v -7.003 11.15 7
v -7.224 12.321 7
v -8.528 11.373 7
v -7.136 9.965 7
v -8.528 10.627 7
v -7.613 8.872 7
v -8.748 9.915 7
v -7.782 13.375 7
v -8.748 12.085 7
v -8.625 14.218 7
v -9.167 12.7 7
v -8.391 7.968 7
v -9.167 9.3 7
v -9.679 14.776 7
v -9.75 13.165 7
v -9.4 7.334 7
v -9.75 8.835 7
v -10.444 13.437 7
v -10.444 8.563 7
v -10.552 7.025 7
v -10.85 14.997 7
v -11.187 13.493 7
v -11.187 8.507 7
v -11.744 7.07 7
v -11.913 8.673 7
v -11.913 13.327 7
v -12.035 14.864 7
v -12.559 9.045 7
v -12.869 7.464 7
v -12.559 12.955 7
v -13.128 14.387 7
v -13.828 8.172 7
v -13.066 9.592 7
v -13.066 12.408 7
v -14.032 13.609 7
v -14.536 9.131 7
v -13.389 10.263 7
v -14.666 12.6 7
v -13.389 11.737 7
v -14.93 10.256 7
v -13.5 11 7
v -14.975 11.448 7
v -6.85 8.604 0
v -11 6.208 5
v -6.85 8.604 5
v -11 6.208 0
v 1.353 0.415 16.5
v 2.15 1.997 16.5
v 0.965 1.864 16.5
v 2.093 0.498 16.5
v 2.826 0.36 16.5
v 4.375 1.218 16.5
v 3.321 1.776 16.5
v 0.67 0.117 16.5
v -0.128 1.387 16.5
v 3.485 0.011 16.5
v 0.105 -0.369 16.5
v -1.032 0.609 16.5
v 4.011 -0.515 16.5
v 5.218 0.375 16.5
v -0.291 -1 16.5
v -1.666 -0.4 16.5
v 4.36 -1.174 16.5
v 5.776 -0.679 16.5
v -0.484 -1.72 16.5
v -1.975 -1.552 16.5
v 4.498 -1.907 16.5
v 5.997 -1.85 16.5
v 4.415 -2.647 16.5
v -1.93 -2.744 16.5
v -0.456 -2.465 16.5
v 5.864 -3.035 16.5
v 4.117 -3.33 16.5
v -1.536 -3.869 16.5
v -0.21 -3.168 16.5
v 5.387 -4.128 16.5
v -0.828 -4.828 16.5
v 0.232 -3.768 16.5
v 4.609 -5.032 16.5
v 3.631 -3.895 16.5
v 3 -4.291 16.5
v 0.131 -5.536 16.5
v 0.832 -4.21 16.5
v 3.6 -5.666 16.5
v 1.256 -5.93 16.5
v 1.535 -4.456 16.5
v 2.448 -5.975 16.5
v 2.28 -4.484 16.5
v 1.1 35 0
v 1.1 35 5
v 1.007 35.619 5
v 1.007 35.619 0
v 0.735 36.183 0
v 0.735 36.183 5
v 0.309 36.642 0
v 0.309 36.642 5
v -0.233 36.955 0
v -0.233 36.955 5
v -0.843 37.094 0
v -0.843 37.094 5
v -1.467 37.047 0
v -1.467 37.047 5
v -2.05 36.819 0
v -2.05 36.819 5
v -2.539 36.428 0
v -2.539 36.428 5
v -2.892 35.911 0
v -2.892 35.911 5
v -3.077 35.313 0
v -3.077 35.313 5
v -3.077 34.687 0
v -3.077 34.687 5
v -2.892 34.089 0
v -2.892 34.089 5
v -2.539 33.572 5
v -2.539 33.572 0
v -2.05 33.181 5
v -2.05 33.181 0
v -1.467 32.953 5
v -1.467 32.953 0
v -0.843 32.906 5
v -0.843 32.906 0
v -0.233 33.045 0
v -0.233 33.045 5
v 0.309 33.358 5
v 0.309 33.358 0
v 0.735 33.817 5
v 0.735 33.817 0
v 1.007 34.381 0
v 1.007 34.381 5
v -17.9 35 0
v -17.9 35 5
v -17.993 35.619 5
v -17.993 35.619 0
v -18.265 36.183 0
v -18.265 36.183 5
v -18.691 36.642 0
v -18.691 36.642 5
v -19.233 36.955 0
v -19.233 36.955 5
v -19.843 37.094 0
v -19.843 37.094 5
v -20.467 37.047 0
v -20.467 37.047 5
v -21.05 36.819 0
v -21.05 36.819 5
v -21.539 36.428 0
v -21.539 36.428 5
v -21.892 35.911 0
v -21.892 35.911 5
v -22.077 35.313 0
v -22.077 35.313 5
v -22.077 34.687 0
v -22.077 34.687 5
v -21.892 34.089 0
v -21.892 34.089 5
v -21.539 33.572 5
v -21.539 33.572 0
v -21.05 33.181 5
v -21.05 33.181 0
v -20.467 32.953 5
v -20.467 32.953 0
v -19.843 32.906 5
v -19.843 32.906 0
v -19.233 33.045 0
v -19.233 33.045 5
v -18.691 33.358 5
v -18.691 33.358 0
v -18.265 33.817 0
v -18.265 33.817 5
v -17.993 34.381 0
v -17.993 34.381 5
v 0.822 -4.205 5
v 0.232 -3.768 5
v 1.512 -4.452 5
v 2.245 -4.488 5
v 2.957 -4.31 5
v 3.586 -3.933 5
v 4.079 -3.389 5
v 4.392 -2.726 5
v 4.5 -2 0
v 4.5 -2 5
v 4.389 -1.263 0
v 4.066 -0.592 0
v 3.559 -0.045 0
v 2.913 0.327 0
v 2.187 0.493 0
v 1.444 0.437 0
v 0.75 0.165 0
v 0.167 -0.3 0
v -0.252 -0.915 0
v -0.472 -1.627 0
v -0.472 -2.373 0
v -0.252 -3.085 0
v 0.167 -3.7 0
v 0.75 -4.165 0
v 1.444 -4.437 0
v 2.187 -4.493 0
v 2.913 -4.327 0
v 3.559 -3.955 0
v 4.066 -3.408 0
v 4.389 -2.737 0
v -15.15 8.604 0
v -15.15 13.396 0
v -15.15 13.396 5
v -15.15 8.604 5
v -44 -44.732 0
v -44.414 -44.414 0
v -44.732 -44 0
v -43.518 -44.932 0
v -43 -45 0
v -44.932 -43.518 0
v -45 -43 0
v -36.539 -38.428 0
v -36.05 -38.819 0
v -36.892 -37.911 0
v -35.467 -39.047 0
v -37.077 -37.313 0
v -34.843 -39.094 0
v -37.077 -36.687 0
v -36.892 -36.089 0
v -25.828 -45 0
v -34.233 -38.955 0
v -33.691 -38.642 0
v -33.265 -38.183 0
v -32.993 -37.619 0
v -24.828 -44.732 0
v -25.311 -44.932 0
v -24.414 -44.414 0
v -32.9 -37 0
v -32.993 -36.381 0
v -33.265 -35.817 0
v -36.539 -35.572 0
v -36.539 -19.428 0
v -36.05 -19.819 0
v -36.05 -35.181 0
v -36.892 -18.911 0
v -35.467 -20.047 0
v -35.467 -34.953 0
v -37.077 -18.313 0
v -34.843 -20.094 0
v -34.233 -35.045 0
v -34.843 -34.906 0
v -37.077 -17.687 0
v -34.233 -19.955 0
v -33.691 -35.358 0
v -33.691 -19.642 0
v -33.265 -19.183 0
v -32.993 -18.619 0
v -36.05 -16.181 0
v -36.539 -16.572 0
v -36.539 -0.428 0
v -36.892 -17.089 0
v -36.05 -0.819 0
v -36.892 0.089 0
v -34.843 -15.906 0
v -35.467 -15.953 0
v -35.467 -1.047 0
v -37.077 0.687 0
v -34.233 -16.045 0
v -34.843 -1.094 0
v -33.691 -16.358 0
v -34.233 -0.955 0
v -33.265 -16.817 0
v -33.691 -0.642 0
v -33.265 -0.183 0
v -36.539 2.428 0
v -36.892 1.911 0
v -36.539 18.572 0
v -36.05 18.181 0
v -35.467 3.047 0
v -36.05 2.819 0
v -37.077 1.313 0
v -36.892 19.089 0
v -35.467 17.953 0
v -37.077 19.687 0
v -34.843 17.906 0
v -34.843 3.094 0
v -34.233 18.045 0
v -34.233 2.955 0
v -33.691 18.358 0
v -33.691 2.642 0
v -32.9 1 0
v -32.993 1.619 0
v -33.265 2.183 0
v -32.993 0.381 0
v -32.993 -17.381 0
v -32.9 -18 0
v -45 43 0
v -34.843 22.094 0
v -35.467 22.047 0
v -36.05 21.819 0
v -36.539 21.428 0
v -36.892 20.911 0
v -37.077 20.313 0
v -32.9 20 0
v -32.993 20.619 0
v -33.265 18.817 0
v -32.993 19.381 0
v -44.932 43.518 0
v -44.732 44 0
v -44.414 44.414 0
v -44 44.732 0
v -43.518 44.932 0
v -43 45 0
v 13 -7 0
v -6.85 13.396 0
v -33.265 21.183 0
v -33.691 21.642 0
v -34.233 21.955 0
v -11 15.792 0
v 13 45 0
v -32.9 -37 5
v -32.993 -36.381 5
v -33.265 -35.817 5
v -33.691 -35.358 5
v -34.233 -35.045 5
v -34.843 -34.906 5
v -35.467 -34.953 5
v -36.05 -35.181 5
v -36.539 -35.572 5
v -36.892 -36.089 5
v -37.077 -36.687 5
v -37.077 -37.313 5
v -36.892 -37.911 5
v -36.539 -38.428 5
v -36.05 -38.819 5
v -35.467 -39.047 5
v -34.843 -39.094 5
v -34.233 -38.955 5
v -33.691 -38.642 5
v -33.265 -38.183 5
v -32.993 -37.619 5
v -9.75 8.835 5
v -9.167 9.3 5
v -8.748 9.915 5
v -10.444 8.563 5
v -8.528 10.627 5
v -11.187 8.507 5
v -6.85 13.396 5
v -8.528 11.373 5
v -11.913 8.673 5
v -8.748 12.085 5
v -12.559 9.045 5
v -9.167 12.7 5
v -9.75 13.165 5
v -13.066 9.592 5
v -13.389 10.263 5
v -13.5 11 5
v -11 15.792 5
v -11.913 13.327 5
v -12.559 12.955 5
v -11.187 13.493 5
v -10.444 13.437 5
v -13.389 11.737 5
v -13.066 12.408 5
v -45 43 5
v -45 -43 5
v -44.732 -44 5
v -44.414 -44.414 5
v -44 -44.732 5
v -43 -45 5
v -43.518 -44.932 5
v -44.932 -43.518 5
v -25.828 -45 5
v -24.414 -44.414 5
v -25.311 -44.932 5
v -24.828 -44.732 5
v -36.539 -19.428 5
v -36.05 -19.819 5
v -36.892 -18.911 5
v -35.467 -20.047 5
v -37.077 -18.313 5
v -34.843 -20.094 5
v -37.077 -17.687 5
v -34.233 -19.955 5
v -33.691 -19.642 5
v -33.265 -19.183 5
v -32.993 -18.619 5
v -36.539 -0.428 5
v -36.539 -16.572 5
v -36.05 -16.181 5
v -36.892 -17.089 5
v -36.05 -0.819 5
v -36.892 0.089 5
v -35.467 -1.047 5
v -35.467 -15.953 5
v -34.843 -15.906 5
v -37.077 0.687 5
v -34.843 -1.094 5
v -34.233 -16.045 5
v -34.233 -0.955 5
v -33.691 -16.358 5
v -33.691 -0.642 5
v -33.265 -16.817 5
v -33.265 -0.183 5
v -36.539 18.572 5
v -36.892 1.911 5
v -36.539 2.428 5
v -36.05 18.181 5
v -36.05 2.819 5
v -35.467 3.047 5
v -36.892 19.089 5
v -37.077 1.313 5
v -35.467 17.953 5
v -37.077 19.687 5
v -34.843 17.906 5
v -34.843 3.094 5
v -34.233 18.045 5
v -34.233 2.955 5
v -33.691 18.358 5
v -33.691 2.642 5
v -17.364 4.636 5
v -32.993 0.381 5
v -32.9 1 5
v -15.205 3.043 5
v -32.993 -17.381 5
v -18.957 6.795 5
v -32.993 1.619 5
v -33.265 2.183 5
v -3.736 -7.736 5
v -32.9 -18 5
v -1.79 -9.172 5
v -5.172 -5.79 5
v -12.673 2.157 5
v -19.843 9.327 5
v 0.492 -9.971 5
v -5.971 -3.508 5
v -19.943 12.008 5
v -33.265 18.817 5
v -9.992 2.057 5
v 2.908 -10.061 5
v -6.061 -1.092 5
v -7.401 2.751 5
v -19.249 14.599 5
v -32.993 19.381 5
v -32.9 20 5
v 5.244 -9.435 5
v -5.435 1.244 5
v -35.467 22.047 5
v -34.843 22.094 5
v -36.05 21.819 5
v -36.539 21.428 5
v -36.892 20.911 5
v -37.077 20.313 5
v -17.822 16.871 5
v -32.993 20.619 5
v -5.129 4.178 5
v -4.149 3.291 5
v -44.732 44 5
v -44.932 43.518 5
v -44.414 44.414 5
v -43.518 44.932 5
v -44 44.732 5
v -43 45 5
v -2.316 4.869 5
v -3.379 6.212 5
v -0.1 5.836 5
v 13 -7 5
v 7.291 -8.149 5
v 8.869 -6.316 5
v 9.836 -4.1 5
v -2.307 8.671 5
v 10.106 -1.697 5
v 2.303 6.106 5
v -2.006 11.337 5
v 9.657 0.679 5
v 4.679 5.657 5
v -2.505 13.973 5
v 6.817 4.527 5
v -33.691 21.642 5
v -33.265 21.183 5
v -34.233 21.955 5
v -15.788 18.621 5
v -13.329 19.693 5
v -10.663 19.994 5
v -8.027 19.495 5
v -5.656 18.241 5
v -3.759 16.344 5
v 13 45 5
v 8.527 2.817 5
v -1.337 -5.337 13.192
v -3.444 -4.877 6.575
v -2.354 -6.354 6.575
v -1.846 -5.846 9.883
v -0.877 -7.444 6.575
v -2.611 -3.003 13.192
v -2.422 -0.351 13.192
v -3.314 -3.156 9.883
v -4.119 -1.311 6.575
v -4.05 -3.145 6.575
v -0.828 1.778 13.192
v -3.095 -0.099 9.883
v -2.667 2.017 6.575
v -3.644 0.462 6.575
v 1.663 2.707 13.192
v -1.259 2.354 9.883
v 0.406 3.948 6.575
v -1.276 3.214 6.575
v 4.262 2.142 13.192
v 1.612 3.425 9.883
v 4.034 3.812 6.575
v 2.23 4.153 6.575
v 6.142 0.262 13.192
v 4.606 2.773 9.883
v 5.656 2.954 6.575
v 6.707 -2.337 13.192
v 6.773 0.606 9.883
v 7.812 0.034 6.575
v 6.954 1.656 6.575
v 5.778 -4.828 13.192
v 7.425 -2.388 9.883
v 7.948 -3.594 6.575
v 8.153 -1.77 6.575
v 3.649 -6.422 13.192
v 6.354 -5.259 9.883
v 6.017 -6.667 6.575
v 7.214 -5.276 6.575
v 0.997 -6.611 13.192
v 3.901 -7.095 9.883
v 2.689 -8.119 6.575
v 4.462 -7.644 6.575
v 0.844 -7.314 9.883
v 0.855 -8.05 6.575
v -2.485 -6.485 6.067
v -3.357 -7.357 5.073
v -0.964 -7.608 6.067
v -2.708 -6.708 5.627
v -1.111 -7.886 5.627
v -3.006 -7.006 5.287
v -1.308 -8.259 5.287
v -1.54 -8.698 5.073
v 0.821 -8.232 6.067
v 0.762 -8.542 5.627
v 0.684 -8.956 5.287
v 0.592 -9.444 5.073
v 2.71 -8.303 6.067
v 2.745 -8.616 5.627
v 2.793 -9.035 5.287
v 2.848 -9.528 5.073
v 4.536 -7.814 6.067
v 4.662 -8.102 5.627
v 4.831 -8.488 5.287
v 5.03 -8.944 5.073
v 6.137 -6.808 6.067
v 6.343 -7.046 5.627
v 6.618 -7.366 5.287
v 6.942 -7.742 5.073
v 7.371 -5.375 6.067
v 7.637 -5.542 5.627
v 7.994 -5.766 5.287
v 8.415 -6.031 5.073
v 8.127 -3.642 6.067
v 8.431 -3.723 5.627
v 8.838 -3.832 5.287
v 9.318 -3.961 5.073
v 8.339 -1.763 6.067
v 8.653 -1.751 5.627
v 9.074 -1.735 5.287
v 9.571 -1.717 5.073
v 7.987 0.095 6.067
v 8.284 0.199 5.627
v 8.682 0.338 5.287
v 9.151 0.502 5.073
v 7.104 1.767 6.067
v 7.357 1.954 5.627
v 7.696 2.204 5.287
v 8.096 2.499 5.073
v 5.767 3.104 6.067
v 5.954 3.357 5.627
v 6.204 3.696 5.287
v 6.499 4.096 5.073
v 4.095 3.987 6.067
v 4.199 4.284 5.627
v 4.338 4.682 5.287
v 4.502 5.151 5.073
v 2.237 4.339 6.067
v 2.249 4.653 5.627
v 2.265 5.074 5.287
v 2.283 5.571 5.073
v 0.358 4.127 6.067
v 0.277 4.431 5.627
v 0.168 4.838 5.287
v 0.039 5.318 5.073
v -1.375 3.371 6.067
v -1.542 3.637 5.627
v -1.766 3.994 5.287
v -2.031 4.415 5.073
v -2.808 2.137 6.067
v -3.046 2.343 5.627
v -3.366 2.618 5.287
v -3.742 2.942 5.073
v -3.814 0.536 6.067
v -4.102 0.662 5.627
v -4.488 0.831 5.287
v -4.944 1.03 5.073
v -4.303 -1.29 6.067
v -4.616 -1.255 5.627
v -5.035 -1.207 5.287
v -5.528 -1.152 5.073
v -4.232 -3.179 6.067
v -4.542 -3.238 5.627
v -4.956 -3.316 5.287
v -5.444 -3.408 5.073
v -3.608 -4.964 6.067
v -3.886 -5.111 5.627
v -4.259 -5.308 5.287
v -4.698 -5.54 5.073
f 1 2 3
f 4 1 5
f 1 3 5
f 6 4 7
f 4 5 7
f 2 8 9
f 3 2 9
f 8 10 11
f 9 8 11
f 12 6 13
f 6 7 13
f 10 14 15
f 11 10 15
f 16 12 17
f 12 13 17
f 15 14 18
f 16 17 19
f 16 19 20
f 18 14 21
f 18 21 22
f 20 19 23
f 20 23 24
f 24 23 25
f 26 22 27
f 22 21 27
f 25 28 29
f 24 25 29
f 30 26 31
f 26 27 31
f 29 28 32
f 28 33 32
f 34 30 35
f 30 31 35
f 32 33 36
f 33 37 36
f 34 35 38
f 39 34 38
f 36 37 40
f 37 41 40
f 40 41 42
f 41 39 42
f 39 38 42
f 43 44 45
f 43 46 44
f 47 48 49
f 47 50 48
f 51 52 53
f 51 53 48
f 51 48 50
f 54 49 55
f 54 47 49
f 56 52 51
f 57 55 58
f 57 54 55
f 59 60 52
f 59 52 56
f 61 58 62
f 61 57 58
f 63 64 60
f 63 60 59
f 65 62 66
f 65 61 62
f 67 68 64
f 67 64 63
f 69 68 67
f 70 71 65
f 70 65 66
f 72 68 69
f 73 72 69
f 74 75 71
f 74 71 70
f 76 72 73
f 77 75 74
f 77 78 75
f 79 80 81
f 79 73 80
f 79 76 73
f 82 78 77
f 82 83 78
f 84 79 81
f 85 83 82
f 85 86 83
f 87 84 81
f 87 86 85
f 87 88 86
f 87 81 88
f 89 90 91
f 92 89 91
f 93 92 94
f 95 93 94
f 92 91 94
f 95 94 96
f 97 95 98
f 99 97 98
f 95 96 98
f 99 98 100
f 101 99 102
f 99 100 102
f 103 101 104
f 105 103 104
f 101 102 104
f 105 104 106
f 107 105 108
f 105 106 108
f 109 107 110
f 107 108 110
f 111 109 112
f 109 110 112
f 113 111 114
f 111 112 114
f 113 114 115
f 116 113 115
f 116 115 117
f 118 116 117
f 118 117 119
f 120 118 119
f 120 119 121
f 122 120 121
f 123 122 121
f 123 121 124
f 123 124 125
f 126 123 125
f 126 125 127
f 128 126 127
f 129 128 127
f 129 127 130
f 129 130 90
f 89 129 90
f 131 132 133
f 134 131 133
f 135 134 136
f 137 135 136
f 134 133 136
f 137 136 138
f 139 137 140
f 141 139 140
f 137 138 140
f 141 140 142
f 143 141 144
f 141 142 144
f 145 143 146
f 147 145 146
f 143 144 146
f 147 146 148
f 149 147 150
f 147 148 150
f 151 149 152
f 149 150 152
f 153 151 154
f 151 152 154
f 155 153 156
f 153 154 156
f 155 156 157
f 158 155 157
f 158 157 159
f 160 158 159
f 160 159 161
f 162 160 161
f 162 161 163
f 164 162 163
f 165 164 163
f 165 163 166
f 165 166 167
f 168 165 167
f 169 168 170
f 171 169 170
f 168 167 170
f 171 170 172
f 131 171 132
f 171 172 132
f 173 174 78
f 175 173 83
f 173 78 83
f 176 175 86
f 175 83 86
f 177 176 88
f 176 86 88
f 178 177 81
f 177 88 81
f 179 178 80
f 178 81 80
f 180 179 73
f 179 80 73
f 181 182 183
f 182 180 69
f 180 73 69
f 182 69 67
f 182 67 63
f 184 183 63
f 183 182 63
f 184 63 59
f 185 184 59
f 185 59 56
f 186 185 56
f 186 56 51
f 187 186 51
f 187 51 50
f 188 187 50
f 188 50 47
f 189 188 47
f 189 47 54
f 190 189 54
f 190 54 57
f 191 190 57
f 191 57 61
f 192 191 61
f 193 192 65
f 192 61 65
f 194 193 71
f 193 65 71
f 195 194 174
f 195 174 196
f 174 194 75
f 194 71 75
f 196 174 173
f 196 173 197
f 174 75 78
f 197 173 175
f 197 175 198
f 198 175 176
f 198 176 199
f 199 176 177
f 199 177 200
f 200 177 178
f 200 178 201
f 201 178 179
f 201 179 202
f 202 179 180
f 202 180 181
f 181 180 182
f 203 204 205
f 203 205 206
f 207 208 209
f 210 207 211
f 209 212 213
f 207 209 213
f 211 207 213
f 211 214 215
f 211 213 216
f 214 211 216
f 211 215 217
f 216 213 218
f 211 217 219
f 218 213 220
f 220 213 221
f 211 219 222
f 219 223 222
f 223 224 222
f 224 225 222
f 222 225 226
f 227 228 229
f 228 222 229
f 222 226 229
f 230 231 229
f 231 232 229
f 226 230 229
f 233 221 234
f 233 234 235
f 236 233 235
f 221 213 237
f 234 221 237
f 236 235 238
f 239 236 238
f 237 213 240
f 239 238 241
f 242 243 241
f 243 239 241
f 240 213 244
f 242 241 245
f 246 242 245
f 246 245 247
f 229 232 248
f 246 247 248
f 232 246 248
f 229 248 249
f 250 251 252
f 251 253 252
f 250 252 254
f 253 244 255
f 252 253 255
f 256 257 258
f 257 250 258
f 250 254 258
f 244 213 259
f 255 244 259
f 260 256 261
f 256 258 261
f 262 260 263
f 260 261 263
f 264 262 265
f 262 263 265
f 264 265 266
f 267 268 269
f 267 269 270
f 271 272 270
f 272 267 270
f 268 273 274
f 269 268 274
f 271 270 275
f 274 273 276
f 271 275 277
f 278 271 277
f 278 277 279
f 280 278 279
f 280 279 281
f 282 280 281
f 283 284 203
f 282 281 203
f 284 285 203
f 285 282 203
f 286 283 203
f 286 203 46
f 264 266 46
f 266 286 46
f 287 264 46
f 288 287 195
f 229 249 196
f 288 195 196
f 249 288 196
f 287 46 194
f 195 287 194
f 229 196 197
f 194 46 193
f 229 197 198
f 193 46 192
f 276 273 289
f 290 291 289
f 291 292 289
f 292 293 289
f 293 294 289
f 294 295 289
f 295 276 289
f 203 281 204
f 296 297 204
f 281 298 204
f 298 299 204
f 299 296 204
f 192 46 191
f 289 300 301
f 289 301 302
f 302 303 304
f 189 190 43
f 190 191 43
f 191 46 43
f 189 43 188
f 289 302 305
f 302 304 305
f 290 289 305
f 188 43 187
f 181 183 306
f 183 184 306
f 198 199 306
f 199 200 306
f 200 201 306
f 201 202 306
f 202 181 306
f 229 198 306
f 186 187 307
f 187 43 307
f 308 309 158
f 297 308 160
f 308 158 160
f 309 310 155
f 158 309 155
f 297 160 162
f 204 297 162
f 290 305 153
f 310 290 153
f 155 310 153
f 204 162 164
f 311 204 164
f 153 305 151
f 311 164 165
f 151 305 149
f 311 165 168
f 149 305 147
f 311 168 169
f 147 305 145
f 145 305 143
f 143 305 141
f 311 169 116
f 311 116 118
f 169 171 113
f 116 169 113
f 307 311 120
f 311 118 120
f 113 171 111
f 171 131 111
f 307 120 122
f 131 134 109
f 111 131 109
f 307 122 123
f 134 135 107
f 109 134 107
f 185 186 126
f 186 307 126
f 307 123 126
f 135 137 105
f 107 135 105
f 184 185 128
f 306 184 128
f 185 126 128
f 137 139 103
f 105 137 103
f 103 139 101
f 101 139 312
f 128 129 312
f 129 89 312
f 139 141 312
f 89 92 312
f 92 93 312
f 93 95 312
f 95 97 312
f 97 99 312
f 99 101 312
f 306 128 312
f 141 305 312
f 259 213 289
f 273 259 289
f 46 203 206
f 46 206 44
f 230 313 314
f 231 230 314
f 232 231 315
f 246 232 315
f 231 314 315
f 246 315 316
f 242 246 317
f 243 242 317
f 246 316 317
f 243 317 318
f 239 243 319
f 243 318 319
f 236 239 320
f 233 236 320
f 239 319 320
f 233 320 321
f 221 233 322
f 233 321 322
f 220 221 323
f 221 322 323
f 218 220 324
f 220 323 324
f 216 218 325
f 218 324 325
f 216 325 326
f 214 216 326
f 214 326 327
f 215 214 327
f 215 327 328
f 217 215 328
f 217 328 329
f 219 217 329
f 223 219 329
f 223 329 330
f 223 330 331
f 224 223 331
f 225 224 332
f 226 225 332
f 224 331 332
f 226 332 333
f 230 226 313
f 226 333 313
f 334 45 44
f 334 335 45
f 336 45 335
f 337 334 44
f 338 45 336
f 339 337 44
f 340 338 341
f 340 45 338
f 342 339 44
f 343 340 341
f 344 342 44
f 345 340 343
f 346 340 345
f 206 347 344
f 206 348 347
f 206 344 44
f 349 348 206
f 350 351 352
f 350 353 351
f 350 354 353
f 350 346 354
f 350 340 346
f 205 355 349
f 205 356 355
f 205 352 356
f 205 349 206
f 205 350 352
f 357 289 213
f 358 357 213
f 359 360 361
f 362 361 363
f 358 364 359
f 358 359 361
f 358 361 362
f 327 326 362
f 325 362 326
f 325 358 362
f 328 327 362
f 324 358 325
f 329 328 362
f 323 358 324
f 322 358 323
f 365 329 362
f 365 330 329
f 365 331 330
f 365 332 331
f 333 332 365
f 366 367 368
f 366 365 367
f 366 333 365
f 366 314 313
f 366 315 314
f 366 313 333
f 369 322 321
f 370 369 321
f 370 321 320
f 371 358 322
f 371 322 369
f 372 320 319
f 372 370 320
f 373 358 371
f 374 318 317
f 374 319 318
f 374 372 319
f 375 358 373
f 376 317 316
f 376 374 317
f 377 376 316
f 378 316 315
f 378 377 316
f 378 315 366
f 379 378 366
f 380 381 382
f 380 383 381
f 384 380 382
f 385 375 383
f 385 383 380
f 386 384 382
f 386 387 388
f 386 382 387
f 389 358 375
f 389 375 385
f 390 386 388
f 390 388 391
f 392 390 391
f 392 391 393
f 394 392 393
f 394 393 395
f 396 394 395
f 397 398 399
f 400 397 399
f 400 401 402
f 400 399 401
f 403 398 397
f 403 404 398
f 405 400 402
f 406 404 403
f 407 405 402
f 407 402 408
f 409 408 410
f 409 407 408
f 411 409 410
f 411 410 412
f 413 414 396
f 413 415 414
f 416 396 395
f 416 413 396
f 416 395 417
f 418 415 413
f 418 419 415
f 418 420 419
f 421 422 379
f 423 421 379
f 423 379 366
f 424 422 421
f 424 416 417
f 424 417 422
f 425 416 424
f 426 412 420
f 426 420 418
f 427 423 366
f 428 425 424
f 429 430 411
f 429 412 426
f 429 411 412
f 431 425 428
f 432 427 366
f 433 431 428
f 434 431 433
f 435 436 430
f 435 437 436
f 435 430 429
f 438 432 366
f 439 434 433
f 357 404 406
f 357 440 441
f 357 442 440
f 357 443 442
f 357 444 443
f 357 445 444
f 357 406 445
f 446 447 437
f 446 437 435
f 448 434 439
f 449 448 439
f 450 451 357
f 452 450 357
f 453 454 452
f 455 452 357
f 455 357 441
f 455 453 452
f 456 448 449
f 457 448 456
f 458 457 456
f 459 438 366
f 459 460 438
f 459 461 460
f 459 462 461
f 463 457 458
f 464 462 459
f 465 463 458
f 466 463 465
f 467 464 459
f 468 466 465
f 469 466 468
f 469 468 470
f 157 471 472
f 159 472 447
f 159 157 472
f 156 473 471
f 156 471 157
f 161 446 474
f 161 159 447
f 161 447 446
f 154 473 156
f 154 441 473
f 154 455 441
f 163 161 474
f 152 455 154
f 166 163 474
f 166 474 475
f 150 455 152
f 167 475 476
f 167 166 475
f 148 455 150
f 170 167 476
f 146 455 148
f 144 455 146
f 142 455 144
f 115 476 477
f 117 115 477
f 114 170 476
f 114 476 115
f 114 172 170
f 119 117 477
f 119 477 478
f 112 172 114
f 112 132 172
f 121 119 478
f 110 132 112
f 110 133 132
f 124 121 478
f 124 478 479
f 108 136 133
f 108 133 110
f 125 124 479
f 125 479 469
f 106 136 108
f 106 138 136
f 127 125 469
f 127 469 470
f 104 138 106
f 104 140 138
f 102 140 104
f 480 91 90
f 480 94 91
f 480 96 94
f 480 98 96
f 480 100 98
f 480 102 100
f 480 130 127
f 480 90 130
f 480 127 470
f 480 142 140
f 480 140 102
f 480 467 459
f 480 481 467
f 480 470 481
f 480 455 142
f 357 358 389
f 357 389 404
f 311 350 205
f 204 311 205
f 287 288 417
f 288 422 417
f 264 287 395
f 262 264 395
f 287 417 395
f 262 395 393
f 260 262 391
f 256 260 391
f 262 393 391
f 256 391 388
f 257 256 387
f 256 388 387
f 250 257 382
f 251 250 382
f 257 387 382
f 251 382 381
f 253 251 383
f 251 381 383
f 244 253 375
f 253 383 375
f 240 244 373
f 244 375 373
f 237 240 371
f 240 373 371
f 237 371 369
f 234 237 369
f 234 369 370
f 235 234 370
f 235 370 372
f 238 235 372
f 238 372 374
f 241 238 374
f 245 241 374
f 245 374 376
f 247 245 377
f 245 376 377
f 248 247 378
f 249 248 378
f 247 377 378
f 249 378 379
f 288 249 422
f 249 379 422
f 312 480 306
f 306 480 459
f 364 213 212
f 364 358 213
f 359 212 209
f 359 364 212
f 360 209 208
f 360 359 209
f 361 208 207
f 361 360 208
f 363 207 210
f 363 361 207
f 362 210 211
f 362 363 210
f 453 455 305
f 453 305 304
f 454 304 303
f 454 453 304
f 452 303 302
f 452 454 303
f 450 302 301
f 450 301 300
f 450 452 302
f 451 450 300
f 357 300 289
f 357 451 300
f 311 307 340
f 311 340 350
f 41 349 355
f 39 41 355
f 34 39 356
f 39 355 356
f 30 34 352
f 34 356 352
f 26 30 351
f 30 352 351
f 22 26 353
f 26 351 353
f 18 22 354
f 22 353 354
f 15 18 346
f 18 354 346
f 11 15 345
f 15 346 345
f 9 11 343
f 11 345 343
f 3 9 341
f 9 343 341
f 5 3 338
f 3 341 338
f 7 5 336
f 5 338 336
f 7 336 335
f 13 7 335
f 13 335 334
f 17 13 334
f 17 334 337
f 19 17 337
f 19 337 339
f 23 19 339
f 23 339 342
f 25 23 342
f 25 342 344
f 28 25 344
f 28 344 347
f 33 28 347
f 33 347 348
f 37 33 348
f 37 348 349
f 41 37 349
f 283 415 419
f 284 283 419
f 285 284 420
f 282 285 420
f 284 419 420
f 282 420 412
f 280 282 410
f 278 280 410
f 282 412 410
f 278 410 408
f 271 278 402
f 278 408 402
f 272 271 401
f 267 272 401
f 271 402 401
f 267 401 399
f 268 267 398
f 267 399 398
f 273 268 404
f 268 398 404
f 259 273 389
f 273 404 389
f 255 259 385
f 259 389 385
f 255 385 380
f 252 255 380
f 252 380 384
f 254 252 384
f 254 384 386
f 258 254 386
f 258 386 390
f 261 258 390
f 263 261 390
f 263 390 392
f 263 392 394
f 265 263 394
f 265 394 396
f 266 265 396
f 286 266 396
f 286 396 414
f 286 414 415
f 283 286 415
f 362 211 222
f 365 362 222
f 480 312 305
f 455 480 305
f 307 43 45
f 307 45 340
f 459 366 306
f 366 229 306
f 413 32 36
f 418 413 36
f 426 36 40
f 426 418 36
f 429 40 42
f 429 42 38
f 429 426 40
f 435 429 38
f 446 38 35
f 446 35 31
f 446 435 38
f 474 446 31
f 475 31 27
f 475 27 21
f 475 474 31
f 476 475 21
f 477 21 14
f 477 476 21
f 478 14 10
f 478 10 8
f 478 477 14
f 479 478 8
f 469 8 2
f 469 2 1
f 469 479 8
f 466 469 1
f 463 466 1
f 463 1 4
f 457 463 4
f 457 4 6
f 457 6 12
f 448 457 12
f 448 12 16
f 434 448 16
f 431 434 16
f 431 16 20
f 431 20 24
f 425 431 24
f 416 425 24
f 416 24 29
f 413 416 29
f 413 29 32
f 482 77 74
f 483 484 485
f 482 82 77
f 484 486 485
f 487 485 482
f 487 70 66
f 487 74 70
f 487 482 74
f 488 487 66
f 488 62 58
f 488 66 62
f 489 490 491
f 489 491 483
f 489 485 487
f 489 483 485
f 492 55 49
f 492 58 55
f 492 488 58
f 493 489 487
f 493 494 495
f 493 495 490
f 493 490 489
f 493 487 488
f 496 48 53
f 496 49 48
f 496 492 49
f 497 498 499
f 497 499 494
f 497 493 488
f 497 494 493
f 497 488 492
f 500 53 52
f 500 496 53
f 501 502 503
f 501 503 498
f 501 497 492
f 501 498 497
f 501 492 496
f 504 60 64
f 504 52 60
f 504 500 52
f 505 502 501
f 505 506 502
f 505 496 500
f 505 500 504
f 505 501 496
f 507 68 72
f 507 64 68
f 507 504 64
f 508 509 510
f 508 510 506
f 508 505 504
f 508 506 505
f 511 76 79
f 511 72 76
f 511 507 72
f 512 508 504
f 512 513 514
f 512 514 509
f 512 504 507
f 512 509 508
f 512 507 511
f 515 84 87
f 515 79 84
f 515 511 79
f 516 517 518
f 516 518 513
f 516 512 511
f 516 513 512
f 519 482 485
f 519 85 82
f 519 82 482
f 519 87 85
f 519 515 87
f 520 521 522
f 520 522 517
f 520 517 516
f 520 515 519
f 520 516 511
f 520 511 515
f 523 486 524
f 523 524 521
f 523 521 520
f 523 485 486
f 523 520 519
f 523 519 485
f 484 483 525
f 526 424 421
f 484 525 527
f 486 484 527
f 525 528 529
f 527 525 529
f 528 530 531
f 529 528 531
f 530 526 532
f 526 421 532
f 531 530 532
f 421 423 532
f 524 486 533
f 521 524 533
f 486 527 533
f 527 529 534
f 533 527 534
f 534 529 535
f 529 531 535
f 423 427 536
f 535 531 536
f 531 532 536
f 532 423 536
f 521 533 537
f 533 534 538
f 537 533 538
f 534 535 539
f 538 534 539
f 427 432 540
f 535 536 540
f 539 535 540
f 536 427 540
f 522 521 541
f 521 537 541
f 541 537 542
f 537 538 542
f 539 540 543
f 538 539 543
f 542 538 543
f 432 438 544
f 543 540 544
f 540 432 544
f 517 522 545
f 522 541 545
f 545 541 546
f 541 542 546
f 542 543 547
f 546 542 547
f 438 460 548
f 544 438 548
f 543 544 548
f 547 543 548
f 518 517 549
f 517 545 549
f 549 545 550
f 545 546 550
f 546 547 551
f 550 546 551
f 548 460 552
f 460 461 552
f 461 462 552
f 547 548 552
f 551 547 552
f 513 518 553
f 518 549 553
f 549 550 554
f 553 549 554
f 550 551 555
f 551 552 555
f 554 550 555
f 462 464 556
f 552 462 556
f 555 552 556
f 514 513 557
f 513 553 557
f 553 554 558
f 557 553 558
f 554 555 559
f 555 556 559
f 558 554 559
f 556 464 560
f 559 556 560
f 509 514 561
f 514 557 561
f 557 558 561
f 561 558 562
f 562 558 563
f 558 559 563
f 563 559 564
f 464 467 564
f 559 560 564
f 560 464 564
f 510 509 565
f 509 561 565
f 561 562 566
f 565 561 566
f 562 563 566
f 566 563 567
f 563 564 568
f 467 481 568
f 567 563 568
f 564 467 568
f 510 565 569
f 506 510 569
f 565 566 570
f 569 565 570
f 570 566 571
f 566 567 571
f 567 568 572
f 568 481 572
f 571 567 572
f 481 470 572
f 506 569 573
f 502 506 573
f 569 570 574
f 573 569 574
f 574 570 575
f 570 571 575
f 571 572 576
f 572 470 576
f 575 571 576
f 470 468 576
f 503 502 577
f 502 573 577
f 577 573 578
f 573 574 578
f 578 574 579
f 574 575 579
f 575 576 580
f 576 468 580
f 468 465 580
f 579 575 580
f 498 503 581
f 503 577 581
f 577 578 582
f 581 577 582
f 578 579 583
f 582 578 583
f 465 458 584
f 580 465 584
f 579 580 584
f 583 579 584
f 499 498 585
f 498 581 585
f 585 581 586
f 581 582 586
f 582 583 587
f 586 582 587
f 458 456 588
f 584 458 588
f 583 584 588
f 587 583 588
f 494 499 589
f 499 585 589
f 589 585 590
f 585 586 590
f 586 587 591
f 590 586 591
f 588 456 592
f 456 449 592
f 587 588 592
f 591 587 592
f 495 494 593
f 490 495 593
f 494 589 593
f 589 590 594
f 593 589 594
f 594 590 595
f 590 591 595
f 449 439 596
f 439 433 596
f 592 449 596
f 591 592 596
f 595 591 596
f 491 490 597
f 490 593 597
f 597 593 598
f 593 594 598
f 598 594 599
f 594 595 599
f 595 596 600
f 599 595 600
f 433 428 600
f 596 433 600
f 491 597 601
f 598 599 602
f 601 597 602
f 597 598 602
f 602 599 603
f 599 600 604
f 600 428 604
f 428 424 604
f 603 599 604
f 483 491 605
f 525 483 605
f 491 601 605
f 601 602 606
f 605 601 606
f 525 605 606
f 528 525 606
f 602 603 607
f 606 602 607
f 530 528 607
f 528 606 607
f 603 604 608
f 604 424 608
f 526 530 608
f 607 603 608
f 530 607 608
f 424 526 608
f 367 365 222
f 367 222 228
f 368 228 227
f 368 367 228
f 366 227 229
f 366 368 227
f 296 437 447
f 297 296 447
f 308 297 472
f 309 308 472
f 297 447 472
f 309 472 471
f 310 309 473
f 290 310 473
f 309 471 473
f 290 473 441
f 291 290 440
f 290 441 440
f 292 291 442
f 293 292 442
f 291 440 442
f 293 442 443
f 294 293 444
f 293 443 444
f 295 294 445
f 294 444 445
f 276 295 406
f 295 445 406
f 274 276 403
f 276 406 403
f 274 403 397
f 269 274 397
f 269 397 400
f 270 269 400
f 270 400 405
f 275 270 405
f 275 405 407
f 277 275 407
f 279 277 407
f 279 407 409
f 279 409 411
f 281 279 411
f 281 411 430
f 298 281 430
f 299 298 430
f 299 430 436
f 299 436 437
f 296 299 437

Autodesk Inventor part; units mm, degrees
ref_plane "YZ Plane" through (0, 0, 0) normal (1, 0, 0) x (0, 1, 0)
ref_plane "XZ Plane" through (0, 0, 0) normal (0, 1, 0) x (-1, 0, 0)
ref_plane "XY Plane" through (0, 0, 0) normal (0, 0, 1) x (1, 0, 0)
sketch "Sketch1" plane through (0, 0, 0) normal (0, 0, 1) x (1, 0, 0)
  line L0 (-45, 45) -> (-45, -45)
  line L1 (-45, -45) -> (-25, -45)
  line L2 (-25, -45) -> (45, 25)
  line L3 (45, 25) -> (45, 45)
  line L4 (45, 45) -> (-45, 45)
  point P0 (0, 0)
  point P1 (0, 45)
  point P2 (-45, 0)
  dimension "d0" = 20
  dimension "d1" = 20
  dimension "d2" = 90
  dimension "d3" = 90
extrude "Extrusion1" add sketch "Sketch1" along normal blind 5
sketch "Sketch2" plane through (0, 0, 5) normal (0, 0, 1) x (1, 0, 0)
  circle A0 centre (-11, 11) radius 2.5
  circle A1 centre (2, -2) radius 2.5
  line L0 (-25, -45) -> (45, 25) projected
  line L1 (45, 45) -> (-45, 45) projected
  line L2 (10, -10) -> (-45, 45) construction
  line L3 (-45, 45) -> (-45, -45) projected
  point P0 (0, 0)
  dimension "d6" = 5
  dimension "d7" = 34
  dimension "d8" = 13
extrude "Extrusion2" cut sketch "Sketch2" against normal blind 6
ref_plane "Work Plane2" through (-11, 11, 5) normal (0.7071, -0.7071, 0) x (0.7071, 0.7071, 0)
ref_plane "Work Plane1" through (-9.2322, 9.2322, 5) normal (0.7071, -0.7071, 0) x (0.7071, 0.7071, 0)
sketch "Sketch3" plane through (-11, 11, 5) normal (0.7071, -0.7071, 0) x (0.7071, 0.7071, 0)
  line L0 (-49.4975, 0) -> (49.4975, 0) projected
  line L1 (0, 2) -> (0, 0)
  line L2 (-9, 0) -> (0, 0)
  line L3 (-9, 0) -> (-4, 2)
  line L4 (-4, 2) -> (0, 2)
  point P0 (0, -5)
  dimension "d12" = 9
  dimension "d13" = 2
  dimension "d17" = 4
revolve "Revolution1" add sketch "Sketch3" angle 360 about axis through (-11, 11, 7) along (0, 0, -1)
sketch "Sketch4" plane through (-11, 11, 5) normal (0, 0, -1) x (-1, 0, 0)
  circle A0 centre (0, 0) radius 2.5 projected
  point P0 (-11, -11)
extrude "Extrusion3" cut sketch "Sketch4" against normal up to next
sketch "Sketch5" plane through (0, 0, 5) normal (0, 0, 1) x (1, 0, 0)
  circle A0 centre (-35, -37) radius 2.1
  circle A1 centre (-35, -18) radius 2.1
  circle A2 centre (-35, 20) radius 2.1
  circle A3 centre (-20, 35) radius 2.1
  circle A4 centre (-1, 35) radius 2.1
  circle A5 centre (18, 35) radius 2.1
  circle A6 centre (37, 35) radius 2.1
  line L0 (-45, -45) -> (-25, -45) projected
  line L1 (45, 25) -> (45, 45) projected
  circle A7 centre (-35, 1) radius 2.1
  point P0 (0, 0)
  point P1 (45, 35)
  point P2 (-35, -45)
  point P3 (-35, -45)
  point P4 (-35, -45)
  dimension "d18" = 4.2
  dimension "d19" = 8
  dimension "d20" = 19
  dimension "d21" = 19
  dimension "d22" = 19
  dimension "d23" = 8
  dimension "d24" = 19
  dimension "d25" = 19
  dimension "d26" = 19
extrude "Extrusion4" cut sketch "Sketch5" against normal up to next
sketch "Sketch7" plane through (0, 0, 0) normal (0, 0, -1) x (-1, 0, 0)
  line L0 (15.15, 13.396) -> (15.15, 8.604)
  line L1 (15.15, 8.604) -> (11, 6.208)
  line L2 (11, 6.208) -> (6.85, 8.604)
  line L3 (6.85, 8.604) -> (6.85, 13.396)
  line L4 (6.85, 13.396) -> (11, 15.792)
  line L5 (11, 15.792) -> (15.15, 13.396)
  circle A0 centre (11, 11) radius 2.5 projected
  circle A1 centre (11, 11) radius 4.15 construction
  point P0 (0, 0)
  point P1 (15.15, 11)
  dimension "d30" = 8.3
  dimension "d32" = 8.3
extrude "Extrusion5" cut sketch "Sketch7" against normal blind 5
ref_plane "Work Plane4" through (2, -2, 5) normal (0.7071, -0.7071, 0) x (0.7071, 0.7071, 0)
ref_plane "Work Plane3" through (0.2322, -0.2322, 5) normal (0.7071, -0.7071, 0) x (0.7071, 0.7071, 0)
sketch "Sketch8" plane through (2, -2, 5) normal (0.7071, -0.7071, 0) x (0.7071, 0.7071, 0)
  line L0 (2.5, -5) -> (-2.5, -5) projected
  line L1 (-2.5, 0) -> (2.5, 0) projected
  line L2 (-2.5, 0) -> (2.5, 0) projected
  line L3 (-2.5, 0) -> (-6.5, 0)
  line L4 (-6.5, 0) -> (-4, 11.5)
  line L5 (-4, 11.5) -> (-2.5, 11.5)
  line L6 (-2.5, 0) -> (-2.5, 11.5)
  line L7 (0, 0) -> (0, 4.1579) construction
  point P0 (0, -5)
  dimension "d36" = 4
  dimension "d37" = 1.5
  dimension "d38" = 11.5
revolve "Revolution2" add sketch "Sketch8" angle 360 about axis through (2, -2, 5) along (0, 0, 1)
fillet "Fillet2" radius 2 1 edges at (6.5962, 2.5962, 5)
fillet "Fillet3" radius 2 5 edges at (-45, -45, 2.5) (-25, -45, 2.5) (45, 25, 2.5) (45, 45, 2.5) (-45, 45, 2.5)
sketch "Sketch9" plane through (0, 0, 5) normal (0, 0, 1) x (1, 0, 0)
  line L0 (45, 60.6981) -> (13, 60.6981)
  line L1 (13, 60.6981) -> (13, -8.5167)
  line L2 (13, -8.5167) -> (45, -8.5167)
  line L3 (45, -8.5167) -> (45, 60.6981)
  point P0 (0, 0)
  point P1 (45, 43)
  dimension "d42" = 32
extrude "Extrusion6" cut sketch "Sketch9" against normal up to next
equation "\"d21\" = d20"
equation "\"d22\" = d20"
equation "\"d23\" = d19"
equation "\"d24\" = d20"
equation "\"d25\" = d20"
equation "\"d26\" = d20"
properties part number "bracket-GT2-right"
